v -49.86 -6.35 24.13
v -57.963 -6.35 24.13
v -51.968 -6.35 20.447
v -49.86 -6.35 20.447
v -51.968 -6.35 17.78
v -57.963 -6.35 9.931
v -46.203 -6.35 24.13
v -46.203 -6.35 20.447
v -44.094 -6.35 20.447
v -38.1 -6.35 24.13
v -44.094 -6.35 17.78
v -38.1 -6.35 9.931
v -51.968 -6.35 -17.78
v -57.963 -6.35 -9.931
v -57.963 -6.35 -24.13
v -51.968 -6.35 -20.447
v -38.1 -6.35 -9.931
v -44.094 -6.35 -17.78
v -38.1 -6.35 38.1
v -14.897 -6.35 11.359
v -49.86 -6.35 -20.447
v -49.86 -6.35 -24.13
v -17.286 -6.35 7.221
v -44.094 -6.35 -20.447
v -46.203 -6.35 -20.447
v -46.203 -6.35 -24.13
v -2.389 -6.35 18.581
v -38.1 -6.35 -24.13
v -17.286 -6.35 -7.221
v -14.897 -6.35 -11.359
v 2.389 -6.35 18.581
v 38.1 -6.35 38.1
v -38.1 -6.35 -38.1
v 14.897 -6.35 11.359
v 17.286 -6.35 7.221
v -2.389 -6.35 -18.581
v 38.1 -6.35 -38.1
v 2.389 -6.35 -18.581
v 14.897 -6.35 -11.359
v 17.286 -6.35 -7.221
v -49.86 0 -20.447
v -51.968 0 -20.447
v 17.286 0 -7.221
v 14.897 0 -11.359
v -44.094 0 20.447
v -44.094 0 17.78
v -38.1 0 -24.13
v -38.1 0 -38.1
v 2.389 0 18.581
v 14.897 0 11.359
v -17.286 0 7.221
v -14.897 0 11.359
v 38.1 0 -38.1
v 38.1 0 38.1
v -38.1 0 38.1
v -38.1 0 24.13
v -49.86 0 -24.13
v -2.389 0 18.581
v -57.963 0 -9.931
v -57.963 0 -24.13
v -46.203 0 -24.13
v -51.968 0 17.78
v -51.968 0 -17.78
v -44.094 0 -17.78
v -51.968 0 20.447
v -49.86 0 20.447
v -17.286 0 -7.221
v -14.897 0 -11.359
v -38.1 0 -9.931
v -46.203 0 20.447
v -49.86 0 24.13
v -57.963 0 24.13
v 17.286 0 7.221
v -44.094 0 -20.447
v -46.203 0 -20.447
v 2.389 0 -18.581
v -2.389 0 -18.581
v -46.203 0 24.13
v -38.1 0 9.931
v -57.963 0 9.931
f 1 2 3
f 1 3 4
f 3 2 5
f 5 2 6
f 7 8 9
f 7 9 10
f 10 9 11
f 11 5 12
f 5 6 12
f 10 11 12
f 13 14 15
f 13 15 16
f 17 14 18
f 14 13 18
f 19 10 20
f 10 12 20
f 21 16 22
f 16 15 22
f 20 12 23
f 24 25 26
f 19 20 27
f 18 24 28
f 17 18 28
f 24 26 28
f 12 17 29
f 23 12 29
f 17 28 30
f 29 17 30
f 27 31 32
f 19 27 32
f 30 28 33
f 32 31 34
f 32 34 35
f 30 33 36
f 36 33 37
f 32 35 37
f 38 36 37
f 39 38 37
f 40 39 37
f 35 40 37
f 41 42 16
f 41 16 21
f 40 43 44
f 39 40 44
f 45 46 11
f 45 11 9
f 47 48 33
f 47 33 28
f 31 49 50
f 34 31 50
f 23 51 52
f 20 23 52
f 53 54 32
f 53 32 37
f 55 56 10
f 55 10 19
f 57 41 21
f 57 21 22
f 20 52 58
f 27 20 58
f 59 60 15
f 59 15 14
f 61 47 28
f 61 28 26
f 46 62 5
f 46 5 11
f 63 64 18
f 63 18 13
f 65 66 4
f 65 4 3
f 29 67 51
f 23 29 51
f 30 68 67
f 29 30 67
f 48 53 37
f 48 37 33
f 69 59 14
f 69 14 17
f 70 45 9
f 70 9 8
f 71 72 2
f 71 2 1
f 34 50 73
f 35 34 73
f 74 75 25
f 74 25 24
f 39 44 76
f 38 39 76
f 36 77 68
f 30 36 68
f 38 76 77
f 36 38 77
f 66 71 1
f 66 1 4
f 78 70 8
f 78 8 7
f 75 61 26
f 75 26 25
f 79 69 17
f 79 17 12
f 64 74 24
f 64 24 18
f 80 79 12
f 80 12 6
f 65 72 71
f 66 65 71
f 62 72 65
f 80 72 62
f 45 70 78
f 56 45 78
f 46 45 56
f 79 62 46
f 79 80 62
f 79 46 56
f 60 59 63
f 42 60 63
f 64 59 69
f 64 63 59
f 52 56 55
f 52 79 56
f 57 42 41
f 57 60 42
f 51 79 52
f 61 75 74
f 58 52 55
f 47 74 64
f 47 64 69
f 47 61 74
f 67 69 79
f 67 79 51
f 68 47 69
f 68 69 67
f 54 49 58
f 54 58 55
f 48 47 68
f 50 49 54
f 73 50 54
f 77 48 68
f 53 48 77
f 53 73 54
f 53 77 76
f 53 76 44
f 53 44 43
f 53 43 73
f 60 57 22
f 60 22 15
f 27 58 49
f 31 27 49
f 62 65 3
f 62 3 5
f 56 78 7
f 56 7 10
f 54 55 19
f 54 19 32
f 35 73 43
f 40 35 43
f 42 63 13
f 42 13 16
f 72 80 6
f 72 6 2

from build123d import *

# Parameters (mm, degrees)
BOSS_EXTRUDE1_DEPTH = 6.35


with BuildPart() as part:
    # Sketch1 → Boss-Extrude1 (new body)
    with BuildSketch(Plane(origin=(0, 0, 0), x_dir=(1, 0, 0), z_dir=(0, 1, 0))):
        Polygon((-38.1, -38.1), (38.1, -38.1), (38.1, 38.1), (-38.1, 38.1), (-38.1, 24.13), (-46.2026, 24.13), (-46.2026, 20.447), (-44.0944, 20.447), (-44.0944, 17.78), (-51.9684, 17.78), (-51.9684, 20.447), (-49.8602, 20.447), (-49.8602, 24.13), (-57.9628, 24.13), (-57.9628, 9.9314), (-38.1, 9.9314), (-38.1, -9.9314), (-57.9628, -9.9314), (-57.9628, -24.13), (-49.8602, -24.13), (-49.8602, -20.447), (-51.9684, -20.447), (-51.9684, -17.78), (-44.0944, -17.78), (-44.0944, -20.447), (-46.2026, -20.447), (-46.2026, -24.13), (-38.1, -24.13), align=None)
        Polygon((-2.389310714, -18.580574179), (2.389310714, -18.580574179), (14.896593899, -11.359490865), (17.285904613, -7.221083314), (17.285904613, 7.221083314), (14.896593899, 11.359490865), (2.389310714, 18.580574179), (-2.389310714, 18.580574179), (-14.896593899, 11.359490865), (-17.285904613, 7.221083314), (-17.285904613, -7.221083314), (-14.896593899, -11.359490865), align=None, mode=Mode.SUBTRACT)
    extrude(amount=-BOSS_EXTRUDE1_DEPTH)


solid = part.part
